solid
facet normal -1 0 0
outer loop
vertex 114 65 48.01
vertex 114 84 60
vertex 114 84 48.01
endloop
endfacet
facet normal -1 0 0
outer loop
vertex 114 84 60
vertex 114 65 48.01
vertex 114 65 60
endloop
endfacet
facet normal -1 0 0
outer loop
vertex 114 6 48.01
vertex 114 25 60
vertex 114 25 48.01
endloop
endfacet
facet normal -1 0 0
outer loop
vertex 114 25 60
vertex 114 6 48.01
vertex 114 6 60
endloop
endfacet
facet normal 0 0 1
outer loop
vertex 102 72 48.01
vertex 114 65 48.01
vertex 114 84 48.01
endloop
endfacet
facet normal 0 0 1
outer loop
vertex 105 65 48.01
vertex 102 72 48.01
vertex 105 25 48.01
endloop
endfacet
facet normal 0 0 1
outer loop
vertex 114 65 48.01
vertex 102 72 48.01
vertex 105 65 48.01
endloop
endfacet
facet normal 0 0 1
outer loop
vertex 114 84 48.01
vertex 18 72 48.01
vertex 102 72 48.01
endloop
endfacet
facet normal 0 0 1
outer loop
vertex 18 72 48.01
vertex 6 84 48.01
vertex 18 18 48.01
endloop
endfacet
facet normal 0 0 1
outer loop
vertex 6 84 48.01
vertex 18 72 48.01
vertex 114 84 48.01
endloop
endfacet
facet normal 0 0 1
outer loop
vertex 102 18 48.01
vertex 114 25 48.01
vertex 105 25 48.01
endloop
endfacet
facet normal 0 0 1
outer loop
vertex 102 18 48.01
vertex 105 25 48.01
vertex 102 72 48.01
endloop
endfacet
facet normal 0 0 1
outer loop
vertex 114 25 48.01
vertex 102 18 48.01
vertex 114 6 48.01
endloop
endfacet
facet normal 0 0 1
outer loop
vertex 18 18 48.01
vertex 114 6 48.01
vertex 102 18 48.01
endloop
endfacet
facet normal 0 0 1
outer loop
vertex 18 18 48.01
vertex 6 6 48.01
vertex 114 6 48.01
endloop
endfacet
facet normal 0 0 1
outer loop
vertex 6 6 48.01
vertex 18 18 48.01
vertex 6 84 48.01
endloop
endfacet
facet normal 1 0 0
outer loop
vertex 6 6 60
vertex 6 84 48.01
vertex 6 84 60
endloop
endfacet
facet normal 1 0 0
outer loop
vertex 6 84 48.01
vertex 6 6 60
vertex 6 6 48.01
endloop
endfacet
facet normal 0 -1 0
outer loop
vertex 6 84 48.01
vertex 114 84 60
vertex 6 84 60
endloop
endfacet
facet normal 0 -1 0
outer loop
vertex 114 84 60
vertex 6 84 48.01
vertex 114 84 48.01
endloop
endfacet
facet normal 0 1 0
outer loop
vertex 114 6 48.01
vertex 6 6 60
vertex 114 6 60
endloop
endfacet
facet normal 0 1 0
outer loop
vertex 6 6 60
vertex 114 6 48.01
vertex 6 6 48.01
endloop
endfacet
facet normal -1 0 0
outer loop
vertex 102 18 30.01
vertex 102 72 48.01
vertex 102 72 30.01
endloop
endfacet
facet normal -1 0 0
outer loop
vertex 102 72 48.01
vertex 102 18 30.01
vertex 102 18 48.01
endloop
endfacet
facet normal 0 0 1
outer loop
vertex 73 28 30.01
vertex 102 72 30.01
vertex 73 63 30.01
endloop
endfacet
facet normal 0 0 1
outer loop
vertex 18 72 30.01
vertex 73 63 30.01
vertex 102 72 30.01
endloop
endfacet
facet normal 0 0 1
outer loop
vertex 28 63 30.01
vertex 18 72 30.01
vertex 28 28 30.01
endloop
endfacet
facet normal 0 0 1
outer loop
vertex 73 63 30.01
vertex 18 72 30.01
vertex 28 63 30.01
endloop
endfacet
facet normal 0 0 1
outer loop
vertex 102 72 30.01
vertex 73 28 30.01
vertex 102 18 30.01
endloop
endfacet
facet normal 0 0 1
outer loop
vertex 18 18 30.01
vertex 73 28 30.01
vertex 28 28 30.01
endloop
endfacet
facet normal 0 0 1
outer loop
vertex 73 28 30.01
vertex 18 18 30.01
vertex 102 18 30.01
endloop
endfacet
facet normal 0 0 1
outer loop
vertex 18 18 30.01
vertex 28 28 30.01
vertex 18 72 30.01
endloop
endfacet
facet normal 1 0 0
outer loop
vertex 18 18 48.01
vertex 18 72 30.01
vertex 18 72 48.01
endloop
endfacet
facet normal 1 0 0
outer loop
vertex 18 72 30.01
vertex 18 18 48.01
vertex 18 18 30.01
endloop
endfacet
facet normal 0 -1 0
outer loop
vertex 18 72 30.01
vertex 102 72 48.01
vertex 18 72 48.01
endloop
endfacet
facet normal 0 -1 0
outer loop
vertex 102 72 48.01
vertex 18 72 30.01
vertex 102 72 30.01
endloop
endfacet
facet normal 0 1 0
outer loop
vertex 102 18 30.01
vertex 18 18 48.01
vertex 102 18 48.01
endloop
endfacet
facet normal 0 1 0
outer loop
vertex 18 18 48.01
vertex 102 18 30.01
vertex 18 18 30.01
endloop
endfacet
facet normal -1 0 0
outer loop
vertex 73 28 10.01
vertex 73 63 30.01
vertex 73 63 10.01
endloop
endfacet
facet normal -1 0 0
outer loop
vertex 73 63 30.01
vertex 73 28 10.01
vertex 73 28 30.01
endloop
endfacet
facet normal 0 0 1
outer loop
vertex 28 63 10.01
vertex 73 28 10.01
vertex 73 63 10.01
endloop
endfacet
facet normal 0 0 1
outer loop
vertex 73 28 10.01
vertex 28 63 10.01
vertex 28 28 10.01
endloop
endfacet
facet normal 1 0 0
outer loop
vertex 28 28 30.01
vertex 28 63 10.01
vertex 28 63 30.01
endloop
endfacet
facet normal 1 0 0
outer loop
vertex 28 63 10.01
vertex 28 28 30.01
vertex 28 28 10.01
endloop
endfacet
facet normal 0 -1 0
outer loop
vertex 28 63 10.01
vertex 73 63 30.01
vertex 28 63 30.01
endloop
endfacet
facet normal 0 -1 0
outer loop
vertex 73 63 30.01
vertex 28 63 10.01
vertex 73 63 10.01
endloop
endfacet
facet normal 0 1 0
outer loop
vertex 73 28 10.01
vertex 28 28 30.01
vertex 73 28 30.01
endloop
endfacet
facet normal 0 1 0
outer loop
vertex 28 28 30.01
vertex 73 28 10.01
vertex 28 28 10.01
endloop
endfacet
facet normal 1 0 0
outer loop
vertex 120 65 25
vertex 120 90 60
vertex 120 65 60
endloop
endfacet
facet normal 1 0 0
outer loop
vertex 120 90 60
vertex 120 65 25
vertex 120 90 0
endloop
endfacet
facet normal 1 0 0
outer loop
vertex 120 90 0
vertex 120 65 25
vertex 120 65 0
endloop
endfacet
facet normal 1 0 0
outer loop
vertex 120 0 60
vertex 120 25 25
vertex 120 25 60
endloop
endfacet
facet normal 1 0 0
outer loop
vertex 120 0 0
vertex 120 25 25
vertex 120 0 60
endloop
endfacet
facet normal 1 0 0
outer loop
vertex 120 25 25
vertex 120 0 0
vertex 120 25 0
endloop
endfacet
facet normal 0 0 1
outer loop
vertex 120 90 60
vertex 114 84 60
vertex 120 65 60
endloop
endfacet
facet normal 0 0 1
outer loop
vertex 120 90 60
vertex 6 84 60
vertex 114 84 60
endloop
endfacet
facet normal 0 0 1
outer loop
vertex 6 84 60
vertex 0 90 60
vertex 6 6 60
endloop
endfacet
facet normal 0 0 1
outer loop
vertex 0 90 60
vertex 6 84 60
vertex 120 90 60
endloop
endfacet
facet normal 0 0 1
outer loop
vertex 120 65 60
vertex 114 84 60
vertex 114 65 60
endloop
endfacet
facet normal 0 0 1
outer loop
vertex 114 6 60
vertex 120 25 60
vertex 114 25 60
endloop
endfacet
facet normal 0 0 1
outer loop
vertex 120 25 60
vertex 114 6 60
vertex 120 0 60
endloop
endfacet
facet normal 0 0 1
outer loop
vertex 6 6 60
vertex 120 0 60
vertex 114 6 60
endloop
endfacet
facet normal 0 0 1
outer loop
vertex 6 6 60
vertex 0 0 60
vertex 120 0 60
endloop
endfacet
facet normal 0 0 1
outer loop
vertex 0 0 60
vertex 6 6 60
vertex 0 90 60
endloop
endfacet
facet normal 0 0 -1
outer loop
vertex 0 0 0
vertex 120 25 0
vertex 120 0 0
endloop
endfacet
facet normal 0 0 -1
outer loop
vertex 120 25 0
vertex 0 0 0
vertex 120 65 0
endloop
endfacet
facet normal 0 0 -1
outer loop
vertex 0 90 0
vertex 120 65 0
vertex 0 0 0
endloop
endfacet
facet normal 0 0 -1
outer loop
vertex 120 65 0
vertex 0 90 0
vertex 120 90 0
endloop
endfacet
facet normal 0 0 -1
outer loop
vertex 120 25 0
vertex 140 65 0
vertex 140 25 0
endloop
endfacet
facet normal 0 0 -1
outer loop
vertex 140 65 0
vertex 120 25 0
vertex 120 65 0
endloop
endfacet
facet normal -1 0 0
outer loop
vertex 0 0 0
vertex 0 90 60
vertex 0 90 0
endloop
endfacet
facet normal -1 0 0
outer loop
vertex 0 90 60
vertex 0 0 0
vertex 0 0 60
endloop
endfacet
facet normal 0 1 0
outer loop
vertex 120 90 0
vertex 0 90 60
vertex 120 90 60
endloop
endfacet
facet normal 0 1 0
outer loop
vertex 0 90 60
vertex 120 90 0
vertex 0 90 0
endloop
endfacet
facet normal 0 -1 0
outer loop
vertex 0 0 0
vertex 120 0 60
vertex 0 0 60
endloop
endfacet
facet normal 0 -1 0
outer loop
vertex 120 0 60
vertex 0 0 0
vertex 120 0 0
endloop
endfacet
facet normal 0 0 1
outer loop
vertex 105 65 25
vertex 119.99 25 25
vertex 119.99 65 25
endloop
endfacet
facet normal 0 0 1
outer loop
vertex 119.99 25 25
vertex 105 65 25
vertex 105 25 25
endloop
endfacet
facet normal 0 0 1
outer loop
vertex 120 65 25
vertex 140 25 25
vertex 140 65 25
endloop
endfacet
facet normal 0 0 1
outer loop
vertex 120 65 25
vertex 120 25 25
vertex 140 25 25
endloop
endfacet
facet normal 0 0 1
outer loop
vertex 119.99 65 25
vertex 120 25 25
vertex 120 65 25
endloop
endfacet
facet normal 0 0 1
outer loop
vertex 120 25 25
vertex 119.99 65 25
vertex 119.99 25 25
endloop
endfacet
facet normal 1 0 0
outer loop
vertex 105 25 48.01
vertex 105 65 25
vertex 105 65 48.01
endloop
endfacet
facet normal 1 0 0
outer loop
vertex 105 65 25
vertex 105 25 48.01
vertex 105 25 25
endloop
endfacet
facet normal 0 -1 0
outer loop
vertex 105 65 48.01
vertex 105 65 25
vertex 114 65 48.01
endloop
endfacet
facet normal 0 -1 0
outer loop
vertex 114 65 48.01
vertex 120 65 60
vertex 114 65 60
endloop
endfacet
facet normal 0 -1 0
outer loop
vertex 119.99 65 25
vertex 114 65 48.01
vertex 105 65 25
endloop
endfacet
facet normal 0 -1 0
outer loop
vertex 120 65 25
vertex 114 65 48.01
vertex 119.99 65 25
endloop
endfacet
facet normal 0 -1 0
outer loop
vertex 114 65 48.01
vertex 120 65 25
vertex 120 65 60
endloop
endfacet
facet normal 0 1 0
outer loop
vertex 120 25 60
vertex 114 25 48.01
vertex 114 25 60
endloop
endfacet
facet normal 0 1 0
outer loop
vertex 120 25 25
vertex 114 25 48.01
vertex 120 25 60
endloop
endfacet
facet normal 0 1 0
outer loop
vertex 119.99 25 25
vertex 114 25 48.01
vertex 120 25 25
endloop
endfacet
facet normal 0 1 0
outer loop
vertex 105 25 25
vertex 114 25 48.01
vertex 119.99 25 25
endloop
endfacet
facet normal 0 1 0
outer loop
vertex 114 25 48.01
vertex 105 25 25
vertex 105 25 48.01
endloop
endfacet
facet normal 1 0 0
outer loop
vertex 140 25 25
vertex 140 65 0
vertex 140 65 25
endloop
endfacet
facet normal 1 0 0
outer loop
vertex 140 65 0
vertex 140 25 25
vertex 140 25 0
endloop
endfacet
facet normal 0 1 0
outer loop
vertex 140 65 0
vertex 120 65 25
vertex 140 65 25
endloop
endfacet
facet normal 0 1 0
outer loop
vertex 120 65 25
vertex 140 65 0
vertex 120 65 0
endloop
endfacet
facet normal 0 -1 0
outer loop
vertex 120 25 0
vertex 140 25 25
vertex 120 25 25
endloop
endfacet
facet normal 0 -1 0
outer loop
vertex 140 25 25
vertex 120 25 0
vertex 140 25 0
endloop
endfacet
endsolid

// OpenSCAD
// Parameters

// Main Body Dimensions
body_length = 120;
body_width = 90;
body_height = 60;

// Top Recess (Cavity 1)
rim_thickness = 6;
cavity1_depth = 12;

// Middle Recess (Cavity 2)
cavity2_inset = 12; // Inset relative to the inner edge of the rim
cavity2_depth = 18;

// Deepest Pocket (Cavity 3)
cavity3_length = 45;
cavity3_width = 35;
cavity3_depth = 20;
cavity3_offset_x = 10; // Asymmetric shift to create uneven ledges
cavity3_offset_y = 10;

// Side Projection and Recess
proj_length = 20;
proj_width = 40;
proj_height = 25;
proj_offset_y = 25; // Position along the side (Y-axis)
side_recess_depth = 15; // Cut depth into the main body above projection

// Tolerance for clean boolean operations (prevents Z-fighting)
eps = 0.01;
$fn = 100;

// Module definitions

// Generates the main rectangular solid block
module main_body() {
    cube([body_length, body_width, body_height]);
}

// Generates the subtractive volumes for the nested stepped cavities
module cavities() {
    // Cavity 1: Upper broader recess leaving a thin rim
    translate([rim_thickness, rim_thickness, body_height - cavity1_depth + eps])
        cube([body_length - 2*rim_thickness, body_width - 2*rim_thickness, cavity1_depth]);

    // Cavity 2: Smaller inset rectangular cut continuing downward
    translate([rim_thickness + cavity2_inset, rim_thickness + cavity2_inset, body_height - cavity1_depth - cavity2_depth + eps])
        cube([body_length - 2*(rim_thickness + cavity2_inset), body_width - 2*(rim_thickness + cavity2_inset), cavity2_depth]);

    // Cavity 3: Deepest pocket, shifted to one side for uneven interior ledges
    // Leaves a solid bottom (60 - 12 - 18 - 20 = 10mm remaining thickness)
    translate([rim_thickness + cavity2_inset + cavity3_offset_x, rim_thickness + cavity2_inset + cavity3_offset_y, body_height - cavity1_depth - cavity2_depth - cavity3_depth + eps])
        cube([cavity3_length, cavity3_width, cavity3_depth]);
}

// Generates the subtractive volume for the side recess above the projection
module side_recess() {
    // Recess cut into the main body directly above the side projection
    translate([body_length - side_recess_depth, proj_offset_y, proj_height])
        cube([side_recess_depth + eps, proj_width, body_height - proj_height + eps]);
}

// Generates the additive volume for the side projection
module side_projection() {
    // Added rectangular solid projection along the X-max side
    // Overlaps by eps to ensure a manifold union
    translate([body_length - eps, proj_offset_y, 0])
        cube([proj_length + eps, proj_width, proj_height]);
}

// Main Assembly
union() {
    // Main body with all internal and side recesses removed
    difference() {
        main_body();
        cavities();
        side_recess();
    }
    // Add the side projection
    side_projection();
}
